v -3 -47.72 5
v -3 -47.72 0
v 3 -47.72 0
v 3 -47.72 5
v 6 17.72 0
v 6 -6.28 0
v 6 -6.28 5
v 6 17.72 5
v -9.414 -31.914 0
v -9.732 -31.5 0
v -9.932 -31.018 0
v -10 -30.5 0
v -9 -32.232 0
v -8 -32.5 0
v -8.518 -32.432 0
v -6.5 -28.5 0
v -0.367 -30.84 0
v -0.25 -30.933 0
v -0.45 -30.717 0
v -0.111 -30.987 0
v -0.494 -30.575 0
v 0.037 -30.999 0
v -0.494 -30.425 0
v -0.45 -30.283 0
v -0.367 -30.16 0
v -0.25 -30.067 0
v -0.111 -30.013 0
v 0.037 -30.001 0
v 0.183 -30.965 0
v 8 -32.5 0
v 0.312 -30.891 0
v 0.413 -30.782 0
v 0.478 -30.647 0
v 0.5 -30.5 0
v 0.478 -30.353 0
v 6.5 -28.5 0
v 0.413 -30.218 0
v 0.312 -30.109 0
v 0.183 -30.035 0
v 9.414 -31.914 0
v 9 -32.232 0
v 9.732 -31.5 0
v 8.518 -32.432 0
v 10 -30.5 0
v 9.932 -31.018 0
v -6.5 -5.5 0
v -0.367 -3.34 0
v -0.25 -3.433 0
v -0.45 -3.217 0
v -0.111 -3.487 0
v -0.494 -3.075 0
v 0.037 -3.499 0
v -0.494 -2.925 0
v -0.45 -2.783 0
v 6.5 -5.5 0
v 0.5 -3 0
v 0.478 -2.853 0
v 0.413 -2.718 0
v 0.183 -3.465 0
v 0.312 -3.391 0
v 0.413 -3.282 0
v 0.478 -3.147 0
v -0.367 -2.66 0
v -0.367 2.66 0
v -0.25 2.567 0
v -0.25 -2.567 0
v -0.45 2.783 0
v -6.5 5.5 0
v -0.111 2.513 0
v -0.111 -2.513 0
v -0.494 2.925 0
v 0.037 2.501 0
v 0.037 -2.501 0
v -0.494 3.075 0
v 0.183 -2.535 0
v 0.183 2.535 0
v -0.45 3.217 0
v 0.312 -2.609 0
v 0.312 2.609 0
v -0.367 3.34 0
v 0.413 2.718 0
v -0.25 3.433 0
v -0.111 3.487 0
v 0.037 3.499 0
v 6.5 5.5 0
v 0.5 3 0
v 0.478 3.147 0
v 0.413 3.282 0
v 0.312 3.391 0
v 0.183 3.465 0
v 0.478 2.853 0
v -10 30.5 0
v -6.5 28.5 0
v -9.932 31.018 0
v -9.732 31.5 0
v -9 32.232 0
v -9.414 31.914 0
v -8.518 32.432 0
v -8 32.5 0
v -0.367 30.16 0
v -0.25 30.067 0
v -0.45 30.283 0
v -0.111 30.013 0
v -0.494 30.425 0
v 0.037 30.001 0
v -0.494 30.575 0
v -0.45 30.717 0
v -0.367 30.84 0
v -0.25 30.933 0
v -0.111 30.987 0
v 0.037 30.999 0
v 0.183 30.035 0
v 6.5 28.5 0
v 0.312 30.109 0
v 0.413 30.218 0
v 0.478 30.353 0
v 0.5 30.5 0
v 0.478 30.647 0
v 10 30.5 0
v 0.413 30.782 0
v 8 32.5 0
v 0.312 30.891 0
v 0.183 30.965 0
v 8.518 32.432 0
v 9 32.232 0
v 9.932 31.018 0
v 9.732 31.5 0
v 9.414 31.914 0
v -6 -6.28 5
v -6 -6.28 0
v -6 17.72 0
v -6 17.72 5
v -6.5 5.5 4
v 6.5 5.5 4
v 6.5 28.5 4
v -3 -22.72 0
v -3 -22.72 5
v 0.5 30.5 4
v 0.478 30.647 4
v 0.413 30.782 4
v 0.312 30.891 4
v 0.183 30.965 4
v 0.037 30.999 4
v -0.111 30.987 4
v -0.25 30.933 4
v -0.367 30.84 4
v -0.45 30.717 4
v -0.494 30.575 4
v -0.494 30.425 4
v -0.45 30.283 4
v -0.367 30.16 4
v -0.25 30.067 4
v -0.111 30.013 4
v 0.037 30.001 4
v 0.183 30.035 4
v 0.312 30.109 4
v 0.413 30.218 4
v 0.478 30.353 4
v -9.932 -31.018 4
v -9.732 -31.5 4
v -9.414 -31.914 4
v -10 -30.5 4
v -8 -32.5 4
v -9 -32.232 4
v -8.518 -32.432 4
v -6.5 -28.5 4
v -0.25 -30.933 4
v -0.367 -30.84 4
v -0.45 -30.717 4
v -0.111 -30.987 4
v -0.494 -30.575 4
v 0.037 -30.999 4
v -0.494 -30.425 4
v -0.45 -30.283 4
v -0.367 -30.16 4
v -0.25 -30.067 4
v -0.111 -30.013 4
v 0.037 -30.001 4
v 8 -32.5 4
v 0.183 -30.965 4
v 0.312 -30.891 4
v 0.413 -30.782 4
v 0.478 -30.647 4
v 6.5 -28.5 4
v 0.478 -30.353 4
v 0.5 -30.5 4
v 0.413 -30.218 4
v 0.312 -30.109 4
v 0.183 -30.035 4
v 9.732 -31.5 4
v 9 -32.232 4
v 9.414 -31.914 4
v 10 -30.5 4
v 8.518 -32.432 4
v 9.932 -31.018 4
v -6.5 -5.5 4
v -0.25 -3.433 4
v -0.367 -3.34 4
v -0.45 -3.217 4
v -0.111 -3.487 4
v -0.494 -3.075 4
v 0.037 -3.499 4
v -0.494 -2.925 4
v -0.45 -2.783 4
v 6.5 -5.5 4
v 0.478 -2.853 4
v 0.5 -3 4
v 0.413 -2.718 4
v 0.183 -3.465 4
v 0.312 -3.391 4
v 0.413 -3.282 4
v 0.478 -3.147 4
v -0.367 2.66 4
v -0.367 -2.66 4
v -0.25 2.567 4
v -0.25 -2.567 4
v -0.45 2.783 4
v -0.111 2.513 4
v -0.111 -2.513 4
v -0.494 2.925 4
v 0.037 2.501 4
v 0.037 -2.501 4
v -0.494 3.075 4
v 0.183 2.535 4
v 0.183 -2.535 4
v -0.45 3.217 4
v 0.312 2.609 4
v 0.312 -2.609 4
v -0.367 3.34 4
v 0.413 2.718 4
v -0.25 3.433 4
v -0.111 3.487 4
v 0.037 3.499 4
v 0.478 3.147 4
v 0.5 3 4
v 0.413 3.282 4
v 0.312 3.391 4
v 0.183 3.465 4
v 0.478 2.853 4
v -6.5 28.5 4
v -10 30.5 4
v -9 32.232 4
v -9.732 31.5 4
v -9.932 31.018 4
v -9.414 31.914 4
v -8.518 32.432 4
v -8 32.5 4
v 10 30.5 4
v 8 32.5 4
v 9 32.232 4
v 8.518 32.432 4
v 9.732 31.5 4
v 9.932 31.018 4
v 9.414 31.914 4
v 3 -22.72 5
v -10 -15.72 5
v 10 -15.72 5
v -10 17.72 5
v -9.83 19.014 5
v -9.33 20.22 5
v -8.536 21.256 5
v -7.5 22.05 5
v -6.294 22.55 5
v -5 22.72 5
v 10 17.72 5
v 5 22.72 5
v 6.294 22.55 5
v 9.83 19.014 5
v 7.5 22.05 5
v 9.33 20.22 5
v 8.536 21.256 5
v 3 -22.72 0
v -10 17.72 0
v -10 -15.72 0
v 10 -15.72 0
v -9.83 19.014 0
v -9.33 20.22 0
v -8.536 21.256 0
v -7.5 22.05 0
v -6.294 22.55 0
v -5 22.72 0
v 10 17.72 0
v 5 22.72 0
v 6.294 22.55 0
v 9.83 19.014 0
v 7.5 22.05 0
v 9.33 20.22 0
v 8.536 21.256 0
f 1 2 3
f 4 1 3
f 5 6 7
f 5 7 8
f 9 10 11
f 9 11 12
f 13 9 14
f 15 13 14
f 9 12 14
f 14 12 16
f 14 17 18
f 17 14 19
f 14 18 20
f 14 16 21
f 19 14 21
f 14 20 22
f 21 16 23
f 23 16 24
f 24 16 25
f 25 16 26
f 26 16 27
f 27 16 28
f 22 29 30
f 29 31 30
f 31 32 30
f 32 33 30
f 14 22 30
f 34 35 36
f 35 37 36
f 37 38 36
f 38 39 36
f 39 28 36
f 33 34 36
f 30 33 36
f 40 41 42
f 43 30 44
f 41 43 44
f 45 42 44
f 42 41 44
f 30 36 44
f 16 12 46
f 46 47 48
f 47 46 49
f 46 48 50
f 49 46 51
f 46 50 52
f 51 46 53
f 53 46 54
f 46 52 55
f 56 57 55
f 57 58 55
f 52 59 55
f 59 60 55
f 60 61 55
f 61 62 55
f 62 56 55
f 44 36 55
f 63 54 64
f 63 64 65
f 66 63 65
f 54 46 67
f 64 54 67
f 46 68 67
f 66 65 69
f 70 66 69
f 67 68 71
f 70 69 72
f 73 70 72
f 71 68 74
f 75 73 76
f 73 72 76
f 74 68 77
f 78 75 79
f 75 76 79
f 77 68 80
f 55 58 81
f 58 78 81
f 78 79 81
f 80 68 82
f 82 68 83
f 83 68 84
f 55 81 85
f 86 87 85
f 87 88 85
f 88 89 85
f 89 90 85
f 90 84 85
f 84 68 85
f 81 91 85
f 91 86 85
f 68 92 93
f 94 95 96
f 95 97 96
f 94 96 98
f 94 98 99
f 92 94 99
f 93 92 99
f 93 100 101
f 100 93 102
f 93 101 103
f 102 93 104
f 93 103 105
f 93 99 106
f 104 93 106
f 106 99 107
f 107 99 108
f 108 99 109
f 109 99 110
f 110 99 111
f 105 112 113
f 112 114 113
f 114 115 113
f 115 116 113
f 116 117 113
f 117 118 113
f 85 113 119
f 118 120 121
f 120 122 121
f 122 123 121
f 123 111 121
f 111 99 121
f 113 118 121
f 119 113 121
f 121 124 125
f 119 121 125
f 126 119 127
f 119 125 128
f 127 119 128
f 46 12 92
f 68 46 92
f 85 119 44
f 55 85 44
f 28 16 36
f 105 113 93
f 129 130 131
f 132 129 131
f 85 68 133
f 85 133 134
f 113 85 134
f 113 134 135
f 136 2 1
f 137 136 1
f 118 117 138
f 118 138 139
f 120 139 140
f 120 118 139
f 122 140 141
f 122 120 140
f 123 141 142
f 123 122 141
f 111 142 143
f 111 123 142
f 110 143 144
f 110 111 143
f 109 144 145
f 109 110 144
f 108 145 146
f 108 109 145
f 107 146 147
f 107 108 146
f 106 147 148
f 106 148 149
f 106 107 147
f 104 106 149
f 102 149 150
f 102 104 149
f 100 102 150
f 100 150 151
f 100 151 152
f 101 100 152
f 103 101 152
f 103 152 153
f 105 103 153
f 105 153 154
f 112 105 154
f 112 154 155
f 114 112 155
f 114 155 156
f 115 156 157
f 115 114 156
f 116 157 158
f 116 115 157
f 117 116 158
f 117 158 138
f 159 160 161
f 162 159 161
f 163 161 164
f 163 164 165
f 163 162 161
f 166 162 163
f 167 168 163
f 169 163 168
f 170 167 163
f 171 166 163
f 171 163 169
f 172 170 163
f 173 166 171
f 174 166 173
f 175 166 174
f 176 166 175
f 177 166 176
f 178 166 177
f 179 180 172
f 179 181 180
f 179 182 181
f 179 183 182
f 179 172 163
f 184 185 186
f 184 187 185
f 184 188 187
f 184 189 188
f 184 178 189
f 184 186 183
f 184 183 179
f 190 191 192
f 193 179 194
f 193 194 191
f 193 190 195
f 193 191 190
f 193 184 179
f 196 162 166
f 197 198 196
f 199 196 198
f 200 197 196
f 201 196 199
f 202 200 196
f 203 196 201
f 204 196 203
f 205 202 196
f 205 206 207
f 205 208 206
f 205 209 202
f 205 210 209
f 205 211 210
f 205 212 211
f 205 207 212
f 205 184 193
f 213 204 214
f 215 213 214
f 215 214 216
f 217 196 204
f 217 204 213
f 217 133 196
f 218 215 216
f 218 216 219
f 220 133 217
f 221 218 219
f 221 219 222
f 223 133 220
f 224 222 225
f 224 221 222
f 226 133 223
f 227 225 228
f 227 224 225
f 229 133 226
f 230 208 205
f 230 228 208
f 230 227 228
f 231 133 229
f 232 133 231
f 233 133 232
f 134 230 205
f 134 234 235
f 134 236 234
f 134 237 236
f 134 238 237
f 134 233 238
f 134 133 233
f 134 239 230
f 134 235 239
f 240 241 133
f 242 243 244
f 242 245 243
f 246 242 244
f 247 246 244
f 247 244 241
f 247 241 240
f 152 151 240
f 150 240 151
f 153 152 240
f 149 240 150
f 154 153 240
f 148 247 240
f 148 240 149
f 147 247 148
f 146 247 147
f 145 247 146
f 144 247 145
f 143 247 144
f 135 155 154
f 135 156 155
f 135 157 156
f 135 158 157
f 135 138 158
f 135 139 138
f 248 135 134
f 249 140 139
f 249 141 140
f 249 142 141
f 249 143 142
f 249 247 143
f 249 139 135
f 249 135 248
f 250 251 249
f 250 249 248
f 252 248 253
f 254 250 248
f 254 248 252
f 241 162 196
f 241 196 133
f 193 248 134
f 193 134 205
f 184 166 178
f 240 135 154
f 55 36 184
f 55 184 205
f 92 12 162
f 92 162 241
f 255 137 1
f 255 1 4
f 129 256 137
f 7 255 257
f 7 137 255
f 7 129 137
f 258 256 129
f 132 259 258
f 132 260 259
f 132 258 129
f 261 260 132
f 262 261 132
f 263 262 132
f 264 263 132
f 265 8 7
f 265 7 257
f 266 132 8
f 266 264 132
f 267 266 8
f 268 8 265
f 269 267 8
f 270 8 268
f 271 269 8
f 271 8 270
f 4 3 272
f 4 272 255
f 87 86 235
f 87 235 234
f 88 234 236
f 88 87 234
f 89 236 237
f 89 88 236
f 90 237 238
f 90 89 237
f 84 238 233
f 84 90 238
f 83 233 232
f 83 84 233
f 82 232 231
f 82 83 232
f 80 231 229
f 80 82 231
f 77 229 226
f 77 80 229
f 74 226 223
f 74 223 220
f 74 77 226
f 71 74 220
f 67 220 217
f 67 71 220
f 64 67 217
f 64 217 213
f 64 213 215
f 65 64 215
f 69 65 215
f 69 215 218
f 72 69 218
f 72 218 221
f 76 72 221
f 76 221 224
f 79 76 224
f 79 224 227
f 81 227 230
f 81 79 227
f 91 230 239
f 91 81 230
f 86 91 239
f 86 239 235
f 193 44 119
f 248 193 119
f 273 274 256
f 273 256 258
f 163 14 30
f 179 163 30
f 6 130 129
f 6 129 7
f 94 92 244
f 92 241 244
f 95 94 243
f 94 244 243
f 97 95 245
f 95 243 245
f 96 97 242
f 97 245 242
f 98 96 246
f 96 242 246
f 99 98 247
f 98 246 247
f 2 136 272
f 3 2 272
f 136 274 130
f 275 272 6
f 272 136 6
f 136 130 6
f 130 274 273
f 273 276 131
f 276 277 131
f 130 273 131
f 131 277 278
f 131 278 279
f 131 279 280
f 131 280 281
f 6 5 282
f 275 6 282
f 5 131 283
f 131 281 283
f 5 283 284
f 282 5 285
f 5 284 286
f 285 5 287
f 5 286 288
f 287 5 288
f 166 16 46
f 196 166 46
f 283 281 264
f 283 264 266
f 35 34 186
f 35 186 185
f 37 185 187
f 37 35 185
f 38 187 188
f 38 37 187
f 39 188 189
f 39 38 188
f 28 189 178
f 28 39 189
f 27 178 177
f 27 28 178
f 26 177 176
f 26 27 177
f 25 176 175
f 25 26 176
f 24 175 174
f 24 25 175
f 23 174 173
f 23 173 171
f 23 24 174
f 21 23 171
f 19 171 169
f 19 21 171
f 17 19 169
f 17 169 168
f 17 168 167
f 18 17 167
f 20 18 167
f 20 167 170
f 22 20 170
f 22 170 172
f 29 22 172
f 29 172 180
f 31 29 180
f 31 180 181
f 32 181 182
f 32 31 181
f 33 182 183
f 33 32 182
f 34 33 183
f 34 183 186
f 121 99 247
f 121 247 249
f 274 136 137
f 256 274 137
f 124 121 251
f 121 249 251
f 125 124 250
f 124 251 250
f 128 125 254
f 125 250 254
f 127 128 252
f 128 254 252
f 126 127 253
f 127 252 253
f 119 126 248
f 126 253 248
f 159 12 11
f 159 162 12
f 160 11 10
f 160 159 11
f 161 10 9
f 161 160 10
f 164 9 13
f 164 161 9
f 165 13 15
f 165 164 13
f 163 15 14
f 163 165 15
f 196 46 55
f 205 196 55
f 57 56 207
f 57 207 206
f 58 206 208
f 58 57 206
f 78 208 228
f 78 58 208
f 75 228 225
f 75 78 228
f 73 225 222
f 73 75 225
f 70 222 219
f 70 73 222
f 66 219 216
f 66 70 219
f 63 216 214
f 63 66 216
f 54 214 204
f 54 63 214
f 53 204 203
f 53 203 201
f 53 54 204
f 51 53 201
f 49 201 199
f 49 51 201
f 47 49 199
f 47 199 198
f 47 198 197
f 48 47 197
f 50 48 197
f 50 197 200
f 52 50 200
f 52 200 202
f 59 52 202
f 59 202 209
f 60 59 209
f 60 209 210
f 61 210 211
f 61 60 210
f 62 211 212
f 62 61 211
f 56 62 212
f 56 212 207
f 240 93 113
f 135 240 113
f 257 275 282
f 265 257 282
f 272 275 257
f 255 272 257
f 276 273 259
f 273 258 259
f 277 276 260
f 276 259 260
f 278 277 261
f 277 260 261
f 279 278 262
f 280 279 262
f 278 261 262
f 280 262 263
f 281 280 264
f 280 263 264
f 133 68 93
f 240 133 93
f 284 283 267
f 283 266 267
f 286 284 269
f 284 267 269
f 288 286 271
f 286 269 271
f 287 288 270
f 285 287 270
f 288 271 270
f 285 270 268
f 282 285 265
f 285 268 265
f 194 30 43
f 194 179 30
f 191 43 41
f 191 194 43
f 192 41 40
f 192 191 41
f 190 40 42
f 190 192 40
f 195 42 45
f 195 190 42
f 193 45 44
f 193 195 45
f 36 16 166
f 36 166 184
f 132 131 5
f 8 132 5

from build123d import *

# Parameters (mm, degrees)
F0_W     = 20
F0_H     = 65
F0_R     = 0.5
F0_W_2   = 13
F0_H_2   = 23
F1_DEPTH = 4
F2_R     = 2
F3_W     = 20
F3_H     = 45.4407371581
F3_W_2   = 12
F3_H_2   = 24
F4_DEPTH = 5
F5_SIZE  = 7
F6_DEPTH = 25
F7_R     = 5


with BuildPart() as f1:
    # F0 (on Top) → F1 (new body)
    with BuildSketch(Plane.XY):
        Rectangle(F0_W, F0_H)
        with Locations((0, -30.5)):
            Circle(F0_R, mode=Mode.SUBTRACT)
        with Locations((0, -17)):
            Rectangle(F0_W_2, F0_H_2, mode=Mode.SUBTRACT)
        with Locations((0, -3)):
            Circle(F0_R, mode=Mode.SUBTRACT)
        with Locations((0, 3)):
            Circle(F0_R, mode=Mode.SUBTRACT)
        with Locations((0, 17)):
            Rectangle(F0_W_2, F0_H_2, mode=Mode.SUBTRACT)
        with Locations((0, 30.5)):
            Circle(F0_R, mode=Mode.SUBTRACT)
    extrude(amount=F1_DEPTH)

    # F2
    f2_edges = [f1.edges().sort_by_distance(p)[0] for p in [
        (10, -32.5, 2),
        (10, 32.5, 2),
        (-10, -32.5, 2),
        (-10, 32.5, 2),
    ]]
    fillet(f2_edges, radius=F2_R)


with BuildPart() as f4:
    # F3 (on Top) → F4 (new body)
    with BuildSketch(Plane.XY):
        Rectangle(F3_W, F3_H)
        with Locations((0, 5.720368579)):
            Rectangle(F3_W_2, F3_H_2, mode=Mode.SUBTRACT)
    extrude(amount=F4_DEPTH)

    # F5
    f5_edges = [f4.edges().sort_by_distance(p)[0] for p in [
        (-10, -22.720369, 2.5),
        (10, -22.720369, 2.5),
    ]]
    chamfer(f5_edges, length=F5_SIZE)

    # F6 (add): a face of the model
    f6_faces = [f4.faces().sort_by_distance(p)[0] for p in [
        (0, -22.720368579, 2.5),
    ]]
    extrude(f6_faces, amount=F6_DEPTH)

    # F7
    f7_edges = [f4.edges().sort_by_distance(p)[0] for p in [
        (10, 22.720369, 2.5),
        (-10, 22.720369, 2.5),
    ]]
    fillet(f7_edges, radius=F7_R)


solid = Compound([f1.part, f4.part])
